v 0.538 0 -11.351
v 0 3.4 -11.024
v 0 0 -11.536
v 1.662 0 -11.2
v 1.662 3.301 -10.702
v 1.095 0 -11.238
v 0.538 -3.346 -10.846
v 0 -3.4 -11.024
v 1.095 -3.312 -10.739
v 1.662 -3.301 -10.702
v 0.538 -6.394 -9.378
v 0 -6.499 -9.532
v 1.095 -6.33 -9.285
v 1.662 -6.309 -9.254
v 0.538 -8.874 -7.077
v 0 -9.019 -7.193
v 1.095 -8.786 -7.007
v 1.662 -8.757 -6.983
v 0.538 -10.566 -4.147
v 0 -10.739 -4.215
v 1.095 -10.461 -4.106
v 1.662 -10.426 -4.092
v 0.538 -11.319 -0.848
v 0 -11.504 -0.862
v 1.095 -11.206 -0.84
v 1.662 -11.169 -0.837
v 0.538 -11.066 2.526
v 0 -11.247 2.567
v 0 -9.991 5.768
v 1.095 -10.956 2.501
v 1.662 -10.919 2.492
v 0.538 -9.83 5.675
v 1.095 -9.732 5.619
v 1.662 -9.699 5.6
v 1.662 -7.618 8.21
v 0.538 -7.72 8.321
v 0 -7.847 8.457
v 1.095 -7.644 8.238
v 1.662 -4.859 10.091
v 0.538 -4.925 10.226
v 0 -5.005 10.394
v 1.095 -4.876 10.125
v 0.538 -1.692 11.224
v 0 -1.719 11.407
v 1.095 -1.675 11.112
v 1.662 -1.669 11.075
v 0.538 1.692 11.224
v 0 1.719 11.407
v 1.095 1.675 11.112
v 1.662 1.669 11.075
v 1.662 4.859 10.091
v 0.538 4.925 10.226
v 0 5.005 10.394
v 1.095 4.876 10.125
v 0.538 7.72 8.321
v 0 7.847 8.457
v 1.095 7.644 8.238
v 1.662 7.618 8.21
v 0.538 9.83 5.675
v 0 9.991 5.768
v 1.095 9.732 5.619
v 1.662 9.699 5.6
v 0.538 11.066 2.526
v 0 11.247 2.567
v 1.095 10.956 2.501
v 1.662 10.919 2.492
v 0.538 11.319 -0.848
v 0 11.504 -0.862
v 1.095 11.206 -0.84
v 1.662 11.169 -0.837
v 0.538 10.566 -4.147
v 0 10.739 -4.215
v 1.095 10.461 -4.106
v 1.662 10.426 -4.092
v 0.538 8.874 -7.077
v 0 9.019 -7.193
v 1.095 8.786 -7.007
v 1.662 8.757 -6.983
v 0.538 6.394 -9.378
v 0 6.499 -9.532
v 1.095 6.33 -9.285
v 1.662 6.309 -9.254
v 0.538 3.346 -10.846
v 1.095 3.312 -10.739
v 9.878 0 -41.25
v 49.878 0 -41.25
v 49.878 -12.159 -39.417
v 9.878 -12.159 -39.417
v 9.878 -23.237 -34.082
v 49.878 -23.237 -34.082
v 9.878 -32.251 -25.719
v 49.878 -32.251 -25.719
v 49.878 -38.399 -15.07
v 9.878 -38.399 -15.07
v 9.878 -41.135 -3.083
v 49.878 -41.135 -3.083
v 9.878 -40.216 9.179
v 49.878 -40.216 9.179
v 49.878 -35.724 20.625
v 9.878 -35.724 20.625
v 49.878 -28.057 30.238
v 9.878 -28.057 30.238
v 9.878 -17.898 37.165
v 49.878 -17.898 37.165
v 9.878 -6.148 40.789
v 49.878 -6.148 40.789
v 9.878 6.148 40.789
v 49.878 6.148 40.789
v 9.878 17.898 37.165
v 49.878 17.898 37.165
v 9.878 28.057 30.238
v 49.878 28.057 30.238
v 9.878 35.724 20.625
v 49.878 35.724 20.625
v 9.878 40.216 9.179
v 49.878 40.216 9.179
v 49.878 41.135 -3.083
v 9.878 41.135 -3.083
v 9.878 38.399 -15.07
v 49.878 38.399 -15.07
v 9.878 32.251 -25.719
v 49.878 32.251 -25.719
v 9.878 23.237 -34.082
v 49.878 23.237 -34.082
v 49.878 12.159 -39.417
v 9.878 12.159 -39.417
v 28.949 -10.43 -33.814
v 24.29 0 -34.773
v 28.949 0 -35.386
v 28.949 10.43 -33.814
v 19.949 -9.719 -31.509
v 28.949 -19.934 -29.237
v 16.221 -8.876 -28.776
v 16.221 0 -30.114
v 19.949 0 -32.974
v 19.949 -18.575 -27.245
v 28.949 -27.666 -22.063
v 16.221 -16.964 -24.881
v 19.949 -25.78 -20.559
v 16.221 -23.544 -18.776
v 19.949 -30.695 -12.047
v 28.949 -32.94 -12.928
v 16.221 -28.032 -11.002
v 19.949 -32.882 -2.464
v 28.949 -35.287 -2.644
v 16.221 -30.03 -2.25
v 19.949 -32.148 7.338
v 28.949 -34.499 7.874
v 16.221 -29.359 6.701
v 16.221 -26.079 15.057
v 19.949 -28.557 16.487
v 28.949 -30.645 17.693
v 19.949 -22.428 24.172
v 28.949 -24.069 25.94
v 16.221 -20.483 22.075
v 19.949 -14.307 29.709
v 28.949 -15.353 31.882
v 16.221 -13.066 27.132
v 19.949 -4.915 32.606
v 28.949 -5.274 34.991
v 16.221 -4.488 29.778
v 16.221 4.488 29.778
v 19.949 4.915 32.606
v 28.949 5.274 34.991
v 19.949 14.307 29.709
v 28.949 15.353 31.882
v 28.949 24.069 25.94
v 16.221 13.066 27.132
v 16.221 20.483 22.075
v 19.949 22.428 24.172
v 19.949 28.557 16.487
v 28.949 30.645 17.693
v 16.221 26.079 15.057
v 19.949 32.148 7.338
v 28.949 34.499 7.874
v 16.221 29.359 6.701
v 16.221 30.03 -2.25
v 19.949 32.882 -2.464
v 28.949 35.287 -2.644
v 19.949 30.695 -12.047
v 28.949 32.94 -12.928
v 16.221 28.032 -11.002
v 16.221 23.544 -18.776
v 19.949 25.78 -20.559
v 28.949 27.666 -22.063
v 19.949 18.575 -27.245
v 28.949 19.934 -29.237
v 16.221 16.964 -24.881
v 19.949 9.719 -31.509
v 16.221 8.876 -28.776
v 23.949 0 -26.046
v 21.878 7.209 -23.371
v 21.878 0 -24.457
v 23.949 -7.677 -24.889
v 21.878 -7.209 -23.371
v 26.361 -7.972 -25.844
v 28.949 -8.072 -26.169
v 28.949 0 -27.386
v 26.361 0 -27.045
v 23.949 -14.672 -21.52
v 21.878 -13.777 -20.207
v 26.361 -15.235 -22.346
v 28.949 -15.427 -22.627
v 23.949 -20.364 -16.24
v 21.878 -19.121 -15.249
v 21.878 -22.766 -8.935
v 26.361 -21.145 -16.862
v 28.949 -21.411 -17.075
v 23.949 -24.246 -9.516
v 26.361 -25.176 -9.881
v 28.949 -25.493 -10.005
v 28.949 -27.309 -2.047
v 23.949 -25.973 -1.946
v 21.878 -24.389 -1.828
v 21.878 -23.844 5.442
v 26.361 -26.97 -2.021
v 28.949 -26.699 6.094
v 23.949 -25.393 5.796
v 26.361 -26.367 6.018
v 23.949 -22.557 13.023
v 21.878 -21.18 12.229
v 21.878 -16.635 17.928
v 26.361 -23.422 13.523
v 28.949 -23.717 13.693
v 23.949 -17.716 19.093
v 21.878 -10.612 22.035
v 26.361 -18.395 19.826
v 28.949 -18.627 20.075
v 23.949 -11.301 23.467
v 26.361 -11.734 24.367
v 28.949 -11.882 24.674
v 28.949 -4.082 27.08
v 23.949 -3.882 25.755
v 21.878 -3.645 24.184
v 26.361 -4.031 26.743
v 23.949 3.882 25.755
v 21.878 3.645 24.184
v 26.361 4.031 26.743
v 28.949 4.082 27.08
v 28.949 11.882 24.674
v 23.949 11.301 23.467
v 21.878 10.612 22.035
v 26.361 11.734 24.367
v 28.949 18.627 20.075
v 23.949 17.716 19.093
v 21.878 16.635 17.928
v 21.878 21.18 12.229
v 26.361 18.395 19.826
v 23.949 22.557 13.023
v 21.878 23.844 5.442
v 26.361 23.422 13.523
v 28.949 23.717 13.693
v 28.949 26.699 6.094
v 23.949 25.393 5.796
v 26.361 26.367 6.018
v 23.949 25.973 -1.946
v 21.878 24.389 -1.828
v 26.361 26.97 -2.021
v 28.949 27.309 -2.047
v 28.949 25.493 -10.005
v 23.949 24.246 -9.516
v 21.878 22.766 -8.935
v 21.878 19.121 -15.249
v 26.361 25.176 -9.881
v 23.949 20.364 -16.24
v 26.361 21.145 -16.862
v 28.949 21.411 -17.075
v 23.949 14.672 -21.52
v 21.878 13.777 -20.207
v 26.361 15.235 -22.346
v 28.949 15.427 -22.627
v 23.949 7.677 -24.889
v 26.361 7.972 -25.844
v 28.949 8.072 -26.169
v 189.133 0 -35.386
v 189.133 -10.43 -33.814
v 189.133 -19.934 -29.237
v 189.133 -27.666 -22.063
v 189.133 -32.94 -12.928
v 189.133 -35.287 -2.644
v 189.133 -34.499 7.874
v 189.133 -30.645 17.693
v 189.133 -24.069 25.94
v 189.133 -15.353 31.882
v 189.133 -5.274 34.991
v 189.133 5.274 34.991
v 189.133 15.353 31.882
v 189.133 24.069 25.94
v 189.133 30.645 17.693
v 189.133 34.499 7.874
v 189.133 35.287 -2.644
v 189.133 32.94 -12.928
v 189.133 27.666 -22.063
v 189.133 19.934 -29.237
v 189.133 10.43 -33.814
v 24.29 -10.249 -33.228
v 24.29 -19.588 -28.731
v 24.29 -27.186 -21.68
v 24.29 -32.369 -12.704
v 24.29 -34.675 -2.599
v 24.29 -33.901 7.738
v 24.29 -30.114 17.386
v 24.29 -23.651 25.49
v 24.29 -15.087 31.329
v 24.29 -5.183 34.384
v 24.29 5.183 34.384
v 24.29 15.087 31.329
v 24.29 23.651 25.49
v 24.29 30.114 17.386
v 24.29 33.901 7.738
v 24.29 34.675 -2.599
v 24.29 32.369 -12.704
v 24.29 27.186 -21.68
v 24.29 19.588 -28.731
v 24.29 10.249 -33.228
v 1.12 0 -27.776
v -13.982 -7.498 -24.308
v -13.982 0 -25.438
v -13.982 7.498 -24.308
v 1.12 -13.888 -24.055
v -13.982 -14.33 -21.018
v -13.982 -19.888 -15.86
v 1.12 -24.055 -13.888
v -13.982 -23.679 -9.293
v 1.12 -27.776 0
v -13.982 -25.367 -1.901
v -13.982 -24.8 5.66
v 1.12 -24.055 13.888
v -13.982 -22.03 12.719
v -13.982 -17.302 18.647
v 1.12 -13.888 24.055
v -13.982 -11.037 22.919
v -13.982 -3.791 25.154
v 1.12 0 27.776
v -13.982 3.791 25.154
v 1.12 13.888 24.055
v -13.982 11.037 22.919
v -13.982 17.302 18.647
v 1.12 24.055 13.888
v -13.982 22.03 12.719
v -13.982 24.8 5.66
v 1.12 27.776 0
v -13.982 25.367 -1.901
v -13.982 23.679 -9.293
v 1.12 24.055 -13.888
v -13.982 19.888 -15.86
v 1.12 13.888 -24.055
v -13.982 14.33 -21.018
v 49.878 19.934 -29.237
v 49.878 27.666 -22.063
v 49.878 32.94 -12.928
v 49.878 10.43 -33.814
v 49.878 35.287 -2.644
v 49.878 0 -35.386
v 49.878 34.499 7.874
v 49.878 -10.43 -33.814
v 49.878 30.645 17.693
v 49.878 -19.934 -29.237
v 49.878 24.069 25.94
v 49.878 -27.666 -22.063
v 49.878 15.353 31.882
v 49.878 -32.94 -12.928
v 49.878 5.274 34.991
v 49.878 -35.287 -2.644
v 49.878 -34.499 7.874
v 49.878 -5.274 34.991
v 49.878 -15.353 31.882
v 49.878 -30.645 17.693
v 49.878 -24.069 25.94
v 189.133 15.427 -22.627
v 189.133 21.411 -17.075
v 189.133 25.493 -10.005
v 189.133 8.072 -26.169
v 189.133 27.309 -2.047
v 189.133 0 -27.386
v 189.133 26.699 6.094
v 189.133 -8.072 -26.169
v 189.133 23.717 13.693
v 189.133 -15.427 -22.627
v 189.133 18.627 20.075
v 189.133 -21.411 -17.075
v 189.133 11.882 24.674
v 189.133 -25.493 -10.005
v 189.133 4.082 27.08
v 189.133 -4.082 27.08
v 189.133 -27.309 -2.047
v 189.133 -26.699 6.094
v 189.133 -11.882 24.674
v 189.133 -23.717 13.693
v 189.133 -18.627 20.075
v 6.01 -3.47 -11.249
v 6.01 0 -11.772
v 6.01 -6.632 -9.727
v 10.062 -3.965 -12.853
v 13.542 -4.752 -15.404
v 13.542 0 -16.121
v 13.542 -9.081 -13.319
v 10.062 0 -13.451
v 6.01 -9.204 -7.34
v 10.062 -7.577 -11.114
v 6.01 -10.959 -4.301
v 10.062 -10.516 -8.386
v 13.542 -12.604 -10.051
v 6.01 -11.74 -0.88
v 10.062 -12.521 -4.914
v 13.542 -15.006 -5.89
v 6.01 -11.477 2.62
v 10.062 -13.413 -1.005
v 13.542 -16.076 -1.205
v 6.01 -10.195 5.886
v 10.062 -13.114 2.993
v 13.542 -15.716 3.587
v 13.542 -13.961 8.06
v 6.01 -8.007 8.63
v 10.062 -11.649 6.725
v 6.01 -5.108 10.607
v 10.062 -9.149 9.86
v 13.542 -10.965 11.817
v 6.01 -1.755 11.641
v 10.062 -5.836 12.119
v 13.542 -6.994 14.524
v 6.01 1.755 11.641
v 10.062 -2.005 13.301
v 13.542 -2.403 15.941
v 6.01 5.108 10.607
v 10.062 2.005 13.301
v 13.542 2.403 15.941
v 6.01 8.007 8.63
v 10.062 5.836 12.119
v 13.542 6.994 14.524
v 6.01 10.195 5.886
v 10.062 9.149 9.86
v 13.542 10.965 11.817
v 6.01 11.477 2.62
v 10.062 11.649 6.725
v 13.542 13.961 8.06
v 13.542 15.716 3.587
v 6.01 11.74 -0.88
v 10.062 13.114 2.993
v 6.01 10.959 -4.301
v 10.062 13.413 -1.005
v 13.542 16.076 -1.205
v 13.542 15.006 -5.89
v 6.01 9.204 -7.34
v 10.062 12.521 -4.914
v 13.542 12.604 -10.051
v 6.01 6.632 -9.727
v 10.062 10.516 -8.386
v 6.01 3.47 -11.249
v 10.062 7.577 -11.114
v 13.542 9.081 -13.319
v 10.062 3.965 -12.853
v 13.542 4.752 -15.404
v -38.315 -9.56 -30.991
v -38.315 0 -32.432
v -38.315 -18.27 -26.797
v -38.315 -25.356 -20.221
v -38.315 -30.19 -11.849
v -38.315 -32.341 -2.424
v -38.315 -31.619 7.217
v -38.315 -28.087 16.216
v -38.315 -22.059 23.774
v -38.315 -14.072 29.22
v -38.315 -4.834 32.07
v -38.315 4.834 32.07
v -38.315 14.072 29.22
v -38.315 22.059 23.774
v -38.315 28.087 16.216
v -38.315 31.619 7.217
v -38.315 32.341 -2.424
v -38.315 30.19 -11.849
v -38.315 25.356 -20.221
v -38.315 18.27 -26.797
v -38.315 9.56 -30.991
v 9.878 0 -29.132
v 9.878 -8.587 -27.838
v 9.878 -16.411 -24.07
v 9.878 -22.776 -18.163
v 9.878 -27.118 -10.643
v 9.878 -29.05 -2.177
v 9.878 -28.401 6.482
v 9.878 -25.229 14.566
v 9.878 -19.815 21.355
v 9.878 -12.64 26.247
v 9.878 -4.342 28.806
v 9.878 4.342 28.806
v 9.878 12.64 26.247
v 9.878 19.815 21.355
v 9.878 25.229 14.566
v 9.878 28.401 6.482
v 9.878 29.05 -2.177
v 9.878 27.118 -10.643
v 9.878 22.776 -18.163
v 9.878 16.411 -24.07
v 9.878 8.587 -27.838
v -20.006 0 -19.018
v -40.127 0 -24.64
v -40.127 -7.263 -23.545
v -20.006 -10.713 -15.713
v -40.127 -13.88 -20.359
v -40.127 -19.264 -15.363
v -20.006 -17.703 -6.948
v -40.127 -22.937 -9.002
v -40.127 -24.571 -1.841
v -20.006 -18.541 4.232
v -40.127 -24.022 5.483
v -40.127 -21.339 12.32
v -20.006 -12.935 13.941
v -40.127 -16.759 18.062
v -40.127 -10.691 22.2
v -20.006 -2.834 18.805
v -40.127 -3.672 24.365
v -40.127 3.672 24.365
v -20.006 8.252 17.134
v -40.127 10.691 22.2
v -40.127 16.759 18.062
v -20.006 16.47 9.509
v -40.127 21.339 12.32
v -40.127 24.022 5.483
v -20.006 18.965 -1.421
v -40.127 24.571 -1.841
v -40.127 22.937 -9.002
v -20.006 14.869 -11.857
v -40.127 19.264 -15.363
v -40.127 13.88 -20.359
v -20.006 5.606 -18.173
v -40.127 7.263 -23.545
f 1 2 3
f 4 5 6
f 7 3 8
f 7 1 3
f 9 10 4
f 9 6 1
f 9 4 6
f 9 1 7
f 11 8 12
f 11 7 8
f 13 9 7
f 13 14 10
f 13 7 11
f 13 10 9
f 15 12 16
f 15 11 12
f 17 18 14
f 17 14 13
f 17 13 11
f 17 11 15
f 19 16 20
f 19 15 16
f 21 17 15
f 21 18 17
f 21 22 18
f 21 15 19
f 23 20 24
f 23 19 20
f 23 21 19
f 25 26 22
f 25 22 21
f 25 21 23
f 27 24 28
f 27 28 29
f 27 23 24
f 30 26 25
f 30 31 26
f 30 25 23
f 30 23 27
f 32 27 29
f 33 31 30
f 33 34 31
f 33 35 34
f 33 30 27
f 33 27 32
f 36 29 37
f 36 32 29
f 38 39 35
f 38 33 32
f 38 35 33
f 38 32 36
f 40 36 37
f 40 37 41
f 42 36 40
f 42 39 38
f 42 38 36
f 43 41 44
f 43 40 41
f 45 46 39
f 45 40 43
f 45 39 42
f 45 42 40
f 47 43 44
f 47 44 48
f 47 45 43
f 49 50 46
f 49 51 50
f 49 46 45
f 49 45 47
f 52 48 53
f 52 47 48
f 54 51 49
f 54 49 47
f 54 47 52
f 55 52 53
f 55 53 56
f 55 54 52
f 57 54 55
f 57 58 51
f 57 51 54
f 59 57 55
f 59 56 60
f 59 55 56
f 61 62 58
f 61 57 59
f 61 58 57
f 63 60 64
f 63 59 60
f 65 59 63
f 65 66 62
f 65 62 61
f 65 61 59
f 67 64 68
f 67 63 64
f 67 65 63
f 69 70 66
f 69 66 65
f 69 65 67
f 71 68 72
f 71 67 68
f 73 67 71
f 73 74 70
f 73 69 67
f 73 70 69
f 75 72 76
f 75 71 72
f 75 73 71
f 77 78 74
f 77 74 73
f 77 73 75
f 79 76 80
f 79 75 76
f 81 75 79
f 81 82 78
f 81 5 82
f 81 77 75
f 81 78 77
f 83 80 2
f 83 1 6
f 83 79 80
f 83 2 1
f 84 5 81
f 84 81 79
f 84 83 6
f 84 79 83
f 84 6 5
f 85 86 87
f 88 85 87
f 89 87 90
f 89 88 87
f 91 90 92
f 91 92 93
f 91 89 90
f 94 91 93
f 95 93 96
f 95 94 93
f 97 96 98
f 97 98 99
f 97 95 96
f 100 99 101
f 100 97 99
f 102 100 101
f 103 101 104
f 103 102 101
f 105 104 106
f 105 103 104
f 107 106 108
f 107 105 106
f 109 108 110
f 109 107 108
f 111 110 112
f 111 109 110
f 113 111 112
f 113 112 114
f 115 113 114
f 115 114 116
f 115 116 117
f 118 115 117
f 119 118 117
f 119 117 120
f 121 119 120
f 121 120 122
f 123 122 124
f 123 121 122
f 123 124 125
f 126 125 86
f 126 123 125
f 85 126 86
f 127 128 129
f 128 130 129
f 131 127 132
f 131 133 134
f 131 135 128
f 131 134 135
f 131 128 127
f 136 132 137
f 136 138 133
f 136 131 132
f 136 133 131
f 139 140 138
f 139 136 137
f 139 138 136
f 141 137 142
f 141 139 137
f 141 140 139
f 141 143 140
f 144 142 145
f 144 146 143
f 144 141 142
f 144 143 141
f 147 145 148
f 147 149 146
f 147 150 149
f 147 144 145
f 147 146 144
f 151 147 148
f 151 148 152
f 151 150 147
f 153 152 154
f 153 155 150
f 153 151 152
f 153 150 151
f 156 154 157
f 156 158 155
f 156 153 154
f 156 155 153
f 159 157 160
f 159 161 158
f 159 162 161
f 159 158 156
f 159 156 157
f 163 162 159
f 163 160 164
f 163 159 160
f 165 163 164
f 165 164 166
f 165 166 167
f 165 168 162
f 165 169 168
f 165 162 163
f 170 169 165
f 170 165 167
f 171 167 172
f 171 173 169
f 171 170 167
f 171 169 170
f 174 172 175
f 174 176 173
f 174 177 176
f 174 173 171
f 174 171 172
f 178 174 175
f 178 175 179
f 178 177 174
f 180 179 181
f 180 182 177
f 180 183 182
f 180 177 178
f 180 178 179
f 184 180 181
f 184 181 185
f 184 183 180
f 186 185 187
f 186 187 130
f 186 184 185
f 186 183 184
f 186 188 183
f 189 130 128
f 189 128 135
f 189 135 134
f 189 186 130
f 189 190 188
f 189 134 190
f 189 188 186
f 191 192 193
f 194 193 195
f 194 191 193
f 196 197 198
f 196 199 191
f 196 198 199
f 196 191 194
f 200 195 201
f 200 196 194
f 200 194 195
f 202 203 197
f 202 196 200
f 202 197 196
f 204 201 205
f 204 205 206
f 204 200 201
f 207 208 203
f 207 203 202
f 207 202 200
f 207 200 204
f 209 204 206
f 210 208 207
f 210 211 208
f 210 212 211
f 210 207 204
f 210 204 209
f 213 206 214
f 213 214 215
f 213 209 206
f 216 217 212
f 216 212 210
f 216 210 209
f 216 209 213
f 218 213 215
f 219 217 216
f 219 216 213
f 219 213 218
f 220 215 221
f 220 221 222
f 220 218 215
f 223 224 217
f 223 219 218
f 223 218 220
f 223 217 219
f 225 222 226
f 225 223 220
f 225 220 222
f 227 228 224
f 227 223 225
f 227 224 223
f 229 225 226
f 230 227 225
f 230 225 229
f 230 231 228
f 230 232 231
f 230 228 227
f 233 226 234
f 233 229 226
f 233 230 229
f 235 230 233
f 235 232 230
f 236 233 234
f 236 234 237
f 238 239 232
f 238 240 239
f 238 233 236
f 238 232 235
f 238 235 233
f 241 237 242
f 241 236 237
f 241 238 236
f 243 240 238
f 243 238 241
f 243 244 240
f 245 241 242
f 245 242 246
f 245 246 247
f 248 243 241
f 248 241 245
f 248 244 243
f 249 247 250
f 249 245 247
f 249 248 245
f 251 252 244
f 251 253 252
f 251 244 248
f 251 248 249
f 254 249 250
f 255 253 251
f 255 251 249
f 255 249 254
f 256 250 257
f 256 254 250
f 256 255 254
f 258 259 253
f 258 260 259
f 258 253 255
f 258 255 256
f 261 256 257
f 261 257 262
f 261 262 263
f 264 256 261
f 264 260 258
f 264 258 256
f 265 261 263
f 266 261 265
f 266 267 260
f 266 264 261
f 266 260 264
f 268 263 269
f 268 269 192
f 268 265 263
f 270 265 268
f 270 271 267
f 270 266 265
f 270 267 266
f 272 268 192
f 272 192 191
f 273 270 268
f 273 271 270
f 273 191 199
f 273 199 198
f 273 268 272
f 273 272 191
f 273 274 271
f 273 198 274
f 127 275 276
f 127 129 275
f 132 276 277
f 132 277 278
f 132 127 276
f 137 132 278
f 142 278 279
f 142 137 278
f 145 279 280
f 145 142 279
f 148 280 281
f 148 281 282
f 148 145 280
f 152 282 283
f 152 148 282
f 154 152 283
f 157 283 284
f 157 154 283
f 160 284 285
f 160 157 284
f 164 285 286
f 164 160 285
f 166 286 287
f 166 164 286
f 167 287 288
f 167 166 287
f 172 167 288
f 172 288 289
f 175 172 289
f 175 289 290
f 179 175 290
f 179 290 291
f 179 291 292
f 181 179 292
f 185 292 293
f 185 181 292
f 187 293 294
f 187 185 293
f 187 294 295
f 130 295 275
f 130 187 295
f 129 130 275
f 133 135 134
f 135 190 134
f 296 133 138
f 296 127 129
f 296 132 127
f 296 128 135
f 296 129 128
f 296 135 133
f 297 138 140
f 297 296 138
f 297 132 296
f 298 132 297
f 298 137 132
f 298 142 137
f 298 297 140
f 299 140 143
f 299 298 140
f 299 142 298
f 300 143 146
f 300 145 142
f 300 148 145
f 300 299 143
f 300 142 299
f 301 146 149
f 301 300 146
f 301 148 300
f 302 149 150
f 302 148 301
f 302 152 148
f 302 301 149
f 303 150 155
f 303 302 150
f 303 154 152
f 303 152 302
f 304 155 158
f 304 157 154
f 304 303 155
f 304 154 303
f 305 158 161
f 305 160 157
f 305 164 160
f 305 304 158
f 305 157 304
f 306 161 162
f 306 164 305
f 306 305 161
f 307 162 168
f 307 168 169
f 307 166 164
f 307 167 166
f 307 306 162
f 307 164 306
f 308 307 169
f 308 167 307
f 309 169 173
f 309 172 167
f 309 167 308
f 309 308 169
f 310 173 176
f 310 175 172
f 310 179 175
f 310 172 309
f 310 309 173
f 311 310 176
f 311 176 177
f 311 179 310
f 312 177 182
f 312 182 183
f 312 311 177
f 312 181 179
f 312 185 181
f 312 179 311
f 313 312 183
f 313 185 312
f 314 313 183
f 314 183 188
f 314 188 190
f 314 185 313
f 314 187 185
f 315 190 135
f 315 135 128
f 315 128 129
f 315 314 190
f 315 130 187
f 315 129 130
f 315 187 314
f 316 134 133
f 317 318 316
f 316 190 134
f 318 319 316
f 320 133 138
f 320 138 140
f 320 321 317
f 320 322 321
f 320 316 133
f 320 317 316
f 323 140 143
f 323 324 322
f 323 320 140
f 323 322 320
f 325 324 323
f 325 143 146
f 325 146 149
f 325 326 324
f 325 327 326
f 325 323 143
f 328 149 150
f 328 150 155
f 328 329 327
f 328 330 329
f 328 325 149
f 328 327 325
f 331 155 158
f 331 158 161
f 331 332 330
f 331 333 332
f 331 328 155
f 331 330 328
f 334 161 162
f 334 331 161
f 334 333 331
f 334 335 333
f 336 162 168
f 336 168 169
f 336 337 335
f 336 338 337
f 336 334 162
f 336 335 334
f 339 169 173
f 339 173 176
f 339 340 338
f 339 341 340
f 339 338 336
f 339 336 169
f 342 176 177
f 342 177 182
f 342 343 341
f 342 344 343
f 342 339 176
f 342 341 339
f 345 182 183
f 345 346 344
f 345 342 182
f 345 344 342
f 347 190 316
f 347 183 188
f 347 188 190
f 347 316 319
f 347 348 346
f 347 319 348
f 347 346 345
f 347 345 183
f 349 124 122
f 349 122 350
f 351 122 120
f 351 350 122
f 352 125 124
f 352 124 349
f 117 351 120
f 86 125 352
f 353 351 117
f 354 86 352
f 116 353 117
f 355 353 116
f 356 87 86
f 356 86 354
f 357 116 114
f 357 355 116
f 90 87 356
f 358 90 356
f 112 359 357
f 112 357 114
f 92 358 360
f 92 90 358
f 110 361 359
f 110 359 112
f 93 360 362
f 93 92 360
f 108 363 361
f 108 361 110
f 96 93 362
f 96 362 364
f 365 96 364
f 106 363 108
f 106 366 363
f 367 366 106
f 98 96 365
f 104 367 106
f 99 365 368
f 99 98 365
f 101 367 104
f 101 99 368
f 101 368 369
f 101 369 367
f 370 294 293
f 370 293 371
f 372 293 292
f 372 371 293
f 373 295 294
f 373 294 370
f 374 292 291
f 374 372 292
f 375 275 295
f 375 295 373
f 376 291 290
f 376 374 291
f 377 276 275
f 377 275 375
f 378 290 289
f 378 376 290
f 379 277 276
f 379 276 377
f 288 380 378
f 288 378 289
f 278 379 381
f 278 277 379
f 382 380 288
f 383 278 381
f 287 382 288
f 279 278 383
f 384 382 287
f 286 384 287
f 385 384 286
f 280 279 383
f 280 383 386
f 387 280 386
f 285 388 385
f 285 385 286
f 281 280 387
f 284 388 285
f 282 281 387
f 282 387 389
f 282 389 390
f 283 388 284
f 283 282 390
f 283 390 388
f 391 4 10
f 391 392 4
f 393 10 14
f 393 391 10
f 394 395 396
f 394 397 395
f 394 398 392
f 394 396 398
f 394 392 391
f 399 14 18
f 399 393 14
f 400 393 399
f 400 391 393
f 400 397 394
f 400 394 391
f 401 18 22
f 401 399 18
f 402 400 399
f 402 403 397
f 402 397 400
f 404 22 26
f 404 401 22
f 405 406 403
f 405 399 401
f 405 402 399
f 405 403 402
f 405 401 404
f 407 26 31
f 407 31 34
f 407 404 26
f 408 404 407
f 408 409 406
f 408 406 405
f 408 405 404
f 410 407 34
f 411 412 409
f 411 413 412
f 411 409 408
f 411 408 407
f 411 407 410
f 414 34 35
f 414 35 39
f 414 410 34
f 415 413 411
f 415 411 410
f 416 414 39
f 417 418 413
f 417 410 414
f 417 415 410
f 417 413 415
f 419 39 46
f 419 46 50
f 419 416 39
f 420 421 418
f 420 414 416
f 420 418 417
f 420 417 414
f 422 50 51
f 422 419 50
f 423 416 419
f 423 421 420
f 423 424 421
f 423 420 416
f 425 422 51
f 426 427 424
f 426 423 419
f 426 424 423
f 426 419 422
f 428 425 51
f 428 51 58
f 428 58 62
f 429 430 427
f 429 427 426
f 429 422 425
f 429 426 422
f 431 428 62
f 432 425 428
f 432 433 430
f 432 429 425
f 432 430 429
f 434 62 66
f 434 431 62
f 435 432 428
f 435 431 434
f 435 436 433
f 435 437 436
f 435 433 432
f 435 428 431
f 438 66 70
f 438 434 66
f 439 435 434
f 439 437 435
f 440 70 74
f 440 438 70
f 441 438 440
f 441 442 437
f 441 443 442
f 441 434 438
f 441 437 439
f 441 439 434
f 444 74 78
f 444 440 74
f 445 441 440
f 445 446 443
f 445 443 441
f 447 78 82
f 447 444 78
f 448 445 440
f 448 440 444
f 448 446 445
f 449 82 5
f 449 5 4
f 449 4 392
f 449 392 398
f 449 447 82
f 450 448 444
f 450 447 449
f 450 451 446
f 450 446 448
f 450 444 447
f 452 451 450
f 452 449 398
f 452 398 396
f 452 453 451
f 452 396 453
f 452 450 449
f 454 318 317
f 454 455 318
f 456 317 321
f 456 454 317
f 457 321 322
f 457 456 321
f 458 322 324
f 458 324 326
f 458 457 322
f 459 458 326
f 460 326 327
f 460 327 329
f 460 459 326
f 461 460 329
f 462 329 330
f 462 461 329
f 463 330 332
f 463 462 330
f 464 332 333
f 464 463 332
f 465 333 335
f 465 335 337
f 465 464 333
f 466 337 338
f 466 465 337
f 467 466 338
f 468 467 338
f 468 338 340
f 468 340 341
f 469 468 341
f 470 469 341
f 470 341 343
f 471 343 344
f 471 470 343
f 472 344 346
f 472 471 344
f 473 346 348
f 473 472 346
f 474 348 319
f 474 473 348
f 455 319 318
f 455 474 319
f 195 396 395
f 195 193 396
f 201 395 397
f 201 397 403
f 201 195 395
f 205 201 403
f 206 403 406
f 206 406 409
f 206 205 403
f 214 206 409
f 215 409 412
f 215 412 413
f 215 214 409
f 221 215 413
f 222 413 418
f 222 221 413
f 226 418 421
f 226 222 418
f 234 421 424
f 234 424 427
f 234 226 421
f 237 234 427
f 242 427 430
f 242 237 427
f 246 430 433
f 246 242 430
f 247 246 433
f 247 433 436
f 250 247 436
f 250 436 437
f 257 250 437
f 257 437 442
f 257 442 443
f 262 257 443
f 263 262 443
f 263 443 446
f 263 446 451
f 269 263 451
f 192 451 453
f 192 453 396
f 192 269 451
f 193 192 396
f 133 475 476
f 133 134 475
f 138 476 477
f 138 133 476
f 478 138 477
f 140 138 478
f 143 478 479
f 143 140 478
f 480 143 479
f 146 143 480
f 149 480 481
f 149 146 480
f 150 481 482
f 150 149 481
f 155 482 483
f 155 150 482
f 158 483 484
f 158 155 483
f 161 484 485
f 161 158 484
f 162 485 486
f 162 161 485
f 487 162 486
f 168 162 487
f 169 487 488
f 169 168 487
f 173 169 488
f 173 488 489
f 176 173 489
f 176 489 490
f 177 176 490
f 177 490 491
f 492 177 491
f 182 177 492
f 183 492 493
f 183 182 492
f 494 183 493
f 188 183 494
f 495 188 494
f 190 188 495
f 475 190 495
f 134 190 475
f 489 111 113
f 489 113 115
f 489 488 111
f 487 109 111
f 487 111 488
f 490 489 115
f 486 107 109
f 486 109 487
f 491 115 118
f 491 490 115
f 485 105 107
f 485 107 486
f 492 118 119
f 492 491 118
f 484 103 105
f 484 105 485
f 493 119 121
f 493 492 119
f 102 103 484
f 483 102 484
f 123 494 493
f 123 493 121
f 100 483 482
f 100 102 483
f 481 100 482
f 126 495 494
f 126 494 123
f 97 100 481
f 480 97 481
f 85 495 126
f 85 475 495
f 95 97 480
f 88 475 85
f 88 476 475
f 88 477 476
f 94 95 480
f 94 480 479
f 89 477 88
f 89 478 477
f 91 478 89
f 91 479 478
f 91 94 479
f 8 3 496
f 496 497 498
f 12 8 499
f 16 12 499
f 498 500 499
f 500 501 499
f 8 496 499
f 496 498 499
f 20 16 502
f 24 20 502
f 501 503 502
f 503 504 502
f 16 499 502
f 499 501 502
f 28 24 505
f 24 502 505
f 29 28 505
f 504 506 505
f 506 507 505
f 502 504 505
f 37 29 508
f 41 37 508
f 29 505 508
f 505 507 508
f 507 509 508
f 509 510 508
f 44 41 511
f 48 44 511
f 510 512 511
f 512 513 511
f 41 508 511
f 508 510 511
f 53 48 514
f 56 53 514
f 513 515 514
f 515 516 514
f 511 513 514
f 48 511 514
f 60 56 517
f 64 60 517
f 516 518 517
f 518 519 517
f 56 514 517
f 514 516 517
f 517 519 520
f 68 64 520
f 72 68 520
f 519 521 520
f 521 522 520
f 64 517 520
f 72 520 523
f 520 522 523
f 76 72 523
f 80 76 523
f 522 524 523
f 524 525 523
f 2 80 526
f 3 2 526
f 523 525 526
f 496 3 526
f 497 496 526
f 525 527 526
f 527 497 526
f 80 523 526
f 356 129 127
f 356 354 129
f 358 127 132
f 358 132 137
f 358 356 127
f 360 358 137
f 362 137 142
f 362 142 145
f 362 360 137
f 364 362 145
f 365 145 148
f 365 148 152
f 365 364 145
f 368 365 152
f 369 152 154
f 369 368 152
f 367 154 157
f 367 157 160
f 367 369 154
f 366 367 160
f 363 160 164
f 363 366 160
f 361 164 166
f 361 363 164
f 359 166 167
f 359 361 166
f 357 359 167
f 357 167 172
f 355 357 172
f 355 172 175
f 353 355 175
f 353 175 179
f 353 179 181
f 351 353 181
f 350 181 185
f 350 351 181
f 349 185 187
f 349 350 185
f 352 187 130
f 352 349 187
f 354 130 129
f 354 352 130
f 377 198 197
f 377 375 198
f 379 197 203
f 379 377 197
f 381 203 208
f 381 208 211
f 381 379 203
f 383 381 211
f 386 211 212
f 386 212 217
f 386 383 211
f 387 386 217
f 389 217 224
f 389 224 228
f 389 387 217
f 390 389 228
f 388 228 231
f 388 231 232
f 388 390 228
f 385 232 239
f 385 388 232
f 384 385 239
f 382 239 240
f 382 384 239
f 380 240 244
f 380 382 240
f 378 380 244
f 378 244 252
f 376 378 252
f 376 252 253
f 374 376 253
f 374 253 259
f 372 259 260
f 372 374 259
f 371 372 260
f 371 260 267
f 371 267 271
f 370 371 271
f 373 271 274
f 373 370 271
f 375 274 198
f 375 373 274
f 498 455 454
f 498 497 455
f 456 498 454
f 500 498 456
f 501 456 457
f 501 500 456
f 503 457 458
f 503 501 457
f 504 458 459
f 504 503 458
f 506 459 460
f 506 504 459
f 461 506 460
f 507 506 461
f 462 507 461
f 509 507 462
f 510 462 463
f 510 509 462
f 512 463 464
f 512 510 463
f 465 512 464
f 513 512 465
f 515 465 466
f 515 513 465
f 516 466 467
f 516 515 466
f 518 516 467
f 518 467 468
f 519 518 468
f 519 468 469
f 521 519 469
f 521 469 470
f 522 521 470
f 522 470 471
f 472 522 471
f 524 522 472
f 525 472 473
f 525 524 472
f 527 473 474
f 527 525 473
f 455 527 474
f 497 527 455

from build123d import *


with BuildPart() as part:
    # Sketch1 → Revolve1 (revolve)
    with BuildSketch(Plane.XY, mode=Mode.PRIVATE) as revolve1_sk:
        with BuildLine():
            Line((28.949236933, 27.386004017), (189.133015331, 27.386004017))
            Line((189.133015331, 27.386004017), (189.133015331, 35.386004017))
            Line((189.133015331, 35.386004017), (28.949236933, 35.386004017))
            ThreePointArc((28.949236933, 35.386004017), (22.060935151, 34.015835602), (16.221314872, 30.113926078))
            Line((16.221314872, 30.113926078), (7.884849119, 21.777460326))
            ThreePointArc((7.884849119, 21.777460326), (5.344435892, 20.007381854), (2.348184674, 19.226769399))
            add(Edge.make_bspline(
                [(2.348184674, 19.226769399), (0.313545637, 20.077506039), (-5.800272609, 22.518234313), (-11.933859149, 24.735791909), (-13.981586934, 25.437652311)],
                knots=[0.018493807, 0.018493807, 0.018493807, 0.117487589, 0.315475154, 0.414468937, 0.414468937, 0.414468937], degree=2))
            add(Edge.make_bspline(
                [(-13.981586934, 25.437652311), (-16.029314719, 26.139512712), (-28.160190772, 30.070121673), (-38.315022829, 32.432092239)],
                knots=[0.414468937, 0.414468937, 0.414468937, 0.513462719, 1, 1, 1], degree=2))
            Line((-38.315022829, 32.432092239), (-40.127010283, 24.64))
            add(Edge.make_bspline(
                [(0, 11.536137468), (-19.948257354, 19.947595697), (-40.127010283, 24.64)],
                knots=[0, 0, 0, 1, 1, 1], degree=2))
            ThreePointArc((0, 11.536137468), (0.81433228, 11.284876268), (1.662309445, 11.2))
            ThreePointArc((1.662309445, 11.2), (8.091391109, 12.478823854), (13.541703369, 16.120606076))
            Line((13.541703369, 16.120606076), (21.878169121, 24.457071829))
            ThreePointArc((21.878169121, 24.457071829), (25.12240261, 26.624799342), (28.949236933, 27.386004017))
        make_face()
        with BuildLine():
            Line((7.884849119, 21.777460326), (16.221314872, 30.113926078))
            Line((16.221314872, 30.113926078), (-13.981586934, 25.437652311))
            add(Edge.make_bspline(
                [(2.348184674, 19.226769399), (0.313545637, 20.077506039), (-5.800272609, 22.518234313), (-11.933859149, 24.735791909), (-13.981586934, 25.437652311)],
                knots=[0.018493807, 0.018493807, 0.018493807, 0.117487589, 0.315475154, 0.414468937, 0.414468937, 0.414468937], degree=2))
            ThreePointArc((2.348184674, 19.226769399), (5.344435892, 20.007381854), (7.884849119, 21.777460326))
        make_face()
    revolve(revolve1_sk.sketch.rotate(Axis((0, 0, 0), (-1, 0, 0)), 90), axis=Axis((0, 0, 0), (-1, 0, 0)))


with BuildPart() as body_2:
    # Sketch3 → Revolve2 (revolve)
    with BuildSketch(Plane.XY, mode=Mode.PRIVATE) as revolve2_sk:
        with BuildLine():
            Line((9.878169121, 29.131825541), (16.221314872, 30.113926078))
            ThreePointArc((16.221314872, 30.113926078), (22.060935151, 34.015835602), (28.949236933, 35.386004017))
            Line((28.949236933, 35.386004017), (49.878169121, 35.386004017))
            Line((49.878169121, 35.386004017), (49.878169121, 41.25))
            Line((49.878169121, 41.25), (9.878169121, 41.25))
            Line((9.878169121, 41.25), (9.878169121, 29.131825541))
        make_face()
    revolve(revolve2_sk.sketch.rotate(Axis((0, 0, 0), (-1, 0, 0)), 90), axis=Axis((0, 0, 0), (-1, 0, 0)))


solid = Compound([part.part, body_2.part])
